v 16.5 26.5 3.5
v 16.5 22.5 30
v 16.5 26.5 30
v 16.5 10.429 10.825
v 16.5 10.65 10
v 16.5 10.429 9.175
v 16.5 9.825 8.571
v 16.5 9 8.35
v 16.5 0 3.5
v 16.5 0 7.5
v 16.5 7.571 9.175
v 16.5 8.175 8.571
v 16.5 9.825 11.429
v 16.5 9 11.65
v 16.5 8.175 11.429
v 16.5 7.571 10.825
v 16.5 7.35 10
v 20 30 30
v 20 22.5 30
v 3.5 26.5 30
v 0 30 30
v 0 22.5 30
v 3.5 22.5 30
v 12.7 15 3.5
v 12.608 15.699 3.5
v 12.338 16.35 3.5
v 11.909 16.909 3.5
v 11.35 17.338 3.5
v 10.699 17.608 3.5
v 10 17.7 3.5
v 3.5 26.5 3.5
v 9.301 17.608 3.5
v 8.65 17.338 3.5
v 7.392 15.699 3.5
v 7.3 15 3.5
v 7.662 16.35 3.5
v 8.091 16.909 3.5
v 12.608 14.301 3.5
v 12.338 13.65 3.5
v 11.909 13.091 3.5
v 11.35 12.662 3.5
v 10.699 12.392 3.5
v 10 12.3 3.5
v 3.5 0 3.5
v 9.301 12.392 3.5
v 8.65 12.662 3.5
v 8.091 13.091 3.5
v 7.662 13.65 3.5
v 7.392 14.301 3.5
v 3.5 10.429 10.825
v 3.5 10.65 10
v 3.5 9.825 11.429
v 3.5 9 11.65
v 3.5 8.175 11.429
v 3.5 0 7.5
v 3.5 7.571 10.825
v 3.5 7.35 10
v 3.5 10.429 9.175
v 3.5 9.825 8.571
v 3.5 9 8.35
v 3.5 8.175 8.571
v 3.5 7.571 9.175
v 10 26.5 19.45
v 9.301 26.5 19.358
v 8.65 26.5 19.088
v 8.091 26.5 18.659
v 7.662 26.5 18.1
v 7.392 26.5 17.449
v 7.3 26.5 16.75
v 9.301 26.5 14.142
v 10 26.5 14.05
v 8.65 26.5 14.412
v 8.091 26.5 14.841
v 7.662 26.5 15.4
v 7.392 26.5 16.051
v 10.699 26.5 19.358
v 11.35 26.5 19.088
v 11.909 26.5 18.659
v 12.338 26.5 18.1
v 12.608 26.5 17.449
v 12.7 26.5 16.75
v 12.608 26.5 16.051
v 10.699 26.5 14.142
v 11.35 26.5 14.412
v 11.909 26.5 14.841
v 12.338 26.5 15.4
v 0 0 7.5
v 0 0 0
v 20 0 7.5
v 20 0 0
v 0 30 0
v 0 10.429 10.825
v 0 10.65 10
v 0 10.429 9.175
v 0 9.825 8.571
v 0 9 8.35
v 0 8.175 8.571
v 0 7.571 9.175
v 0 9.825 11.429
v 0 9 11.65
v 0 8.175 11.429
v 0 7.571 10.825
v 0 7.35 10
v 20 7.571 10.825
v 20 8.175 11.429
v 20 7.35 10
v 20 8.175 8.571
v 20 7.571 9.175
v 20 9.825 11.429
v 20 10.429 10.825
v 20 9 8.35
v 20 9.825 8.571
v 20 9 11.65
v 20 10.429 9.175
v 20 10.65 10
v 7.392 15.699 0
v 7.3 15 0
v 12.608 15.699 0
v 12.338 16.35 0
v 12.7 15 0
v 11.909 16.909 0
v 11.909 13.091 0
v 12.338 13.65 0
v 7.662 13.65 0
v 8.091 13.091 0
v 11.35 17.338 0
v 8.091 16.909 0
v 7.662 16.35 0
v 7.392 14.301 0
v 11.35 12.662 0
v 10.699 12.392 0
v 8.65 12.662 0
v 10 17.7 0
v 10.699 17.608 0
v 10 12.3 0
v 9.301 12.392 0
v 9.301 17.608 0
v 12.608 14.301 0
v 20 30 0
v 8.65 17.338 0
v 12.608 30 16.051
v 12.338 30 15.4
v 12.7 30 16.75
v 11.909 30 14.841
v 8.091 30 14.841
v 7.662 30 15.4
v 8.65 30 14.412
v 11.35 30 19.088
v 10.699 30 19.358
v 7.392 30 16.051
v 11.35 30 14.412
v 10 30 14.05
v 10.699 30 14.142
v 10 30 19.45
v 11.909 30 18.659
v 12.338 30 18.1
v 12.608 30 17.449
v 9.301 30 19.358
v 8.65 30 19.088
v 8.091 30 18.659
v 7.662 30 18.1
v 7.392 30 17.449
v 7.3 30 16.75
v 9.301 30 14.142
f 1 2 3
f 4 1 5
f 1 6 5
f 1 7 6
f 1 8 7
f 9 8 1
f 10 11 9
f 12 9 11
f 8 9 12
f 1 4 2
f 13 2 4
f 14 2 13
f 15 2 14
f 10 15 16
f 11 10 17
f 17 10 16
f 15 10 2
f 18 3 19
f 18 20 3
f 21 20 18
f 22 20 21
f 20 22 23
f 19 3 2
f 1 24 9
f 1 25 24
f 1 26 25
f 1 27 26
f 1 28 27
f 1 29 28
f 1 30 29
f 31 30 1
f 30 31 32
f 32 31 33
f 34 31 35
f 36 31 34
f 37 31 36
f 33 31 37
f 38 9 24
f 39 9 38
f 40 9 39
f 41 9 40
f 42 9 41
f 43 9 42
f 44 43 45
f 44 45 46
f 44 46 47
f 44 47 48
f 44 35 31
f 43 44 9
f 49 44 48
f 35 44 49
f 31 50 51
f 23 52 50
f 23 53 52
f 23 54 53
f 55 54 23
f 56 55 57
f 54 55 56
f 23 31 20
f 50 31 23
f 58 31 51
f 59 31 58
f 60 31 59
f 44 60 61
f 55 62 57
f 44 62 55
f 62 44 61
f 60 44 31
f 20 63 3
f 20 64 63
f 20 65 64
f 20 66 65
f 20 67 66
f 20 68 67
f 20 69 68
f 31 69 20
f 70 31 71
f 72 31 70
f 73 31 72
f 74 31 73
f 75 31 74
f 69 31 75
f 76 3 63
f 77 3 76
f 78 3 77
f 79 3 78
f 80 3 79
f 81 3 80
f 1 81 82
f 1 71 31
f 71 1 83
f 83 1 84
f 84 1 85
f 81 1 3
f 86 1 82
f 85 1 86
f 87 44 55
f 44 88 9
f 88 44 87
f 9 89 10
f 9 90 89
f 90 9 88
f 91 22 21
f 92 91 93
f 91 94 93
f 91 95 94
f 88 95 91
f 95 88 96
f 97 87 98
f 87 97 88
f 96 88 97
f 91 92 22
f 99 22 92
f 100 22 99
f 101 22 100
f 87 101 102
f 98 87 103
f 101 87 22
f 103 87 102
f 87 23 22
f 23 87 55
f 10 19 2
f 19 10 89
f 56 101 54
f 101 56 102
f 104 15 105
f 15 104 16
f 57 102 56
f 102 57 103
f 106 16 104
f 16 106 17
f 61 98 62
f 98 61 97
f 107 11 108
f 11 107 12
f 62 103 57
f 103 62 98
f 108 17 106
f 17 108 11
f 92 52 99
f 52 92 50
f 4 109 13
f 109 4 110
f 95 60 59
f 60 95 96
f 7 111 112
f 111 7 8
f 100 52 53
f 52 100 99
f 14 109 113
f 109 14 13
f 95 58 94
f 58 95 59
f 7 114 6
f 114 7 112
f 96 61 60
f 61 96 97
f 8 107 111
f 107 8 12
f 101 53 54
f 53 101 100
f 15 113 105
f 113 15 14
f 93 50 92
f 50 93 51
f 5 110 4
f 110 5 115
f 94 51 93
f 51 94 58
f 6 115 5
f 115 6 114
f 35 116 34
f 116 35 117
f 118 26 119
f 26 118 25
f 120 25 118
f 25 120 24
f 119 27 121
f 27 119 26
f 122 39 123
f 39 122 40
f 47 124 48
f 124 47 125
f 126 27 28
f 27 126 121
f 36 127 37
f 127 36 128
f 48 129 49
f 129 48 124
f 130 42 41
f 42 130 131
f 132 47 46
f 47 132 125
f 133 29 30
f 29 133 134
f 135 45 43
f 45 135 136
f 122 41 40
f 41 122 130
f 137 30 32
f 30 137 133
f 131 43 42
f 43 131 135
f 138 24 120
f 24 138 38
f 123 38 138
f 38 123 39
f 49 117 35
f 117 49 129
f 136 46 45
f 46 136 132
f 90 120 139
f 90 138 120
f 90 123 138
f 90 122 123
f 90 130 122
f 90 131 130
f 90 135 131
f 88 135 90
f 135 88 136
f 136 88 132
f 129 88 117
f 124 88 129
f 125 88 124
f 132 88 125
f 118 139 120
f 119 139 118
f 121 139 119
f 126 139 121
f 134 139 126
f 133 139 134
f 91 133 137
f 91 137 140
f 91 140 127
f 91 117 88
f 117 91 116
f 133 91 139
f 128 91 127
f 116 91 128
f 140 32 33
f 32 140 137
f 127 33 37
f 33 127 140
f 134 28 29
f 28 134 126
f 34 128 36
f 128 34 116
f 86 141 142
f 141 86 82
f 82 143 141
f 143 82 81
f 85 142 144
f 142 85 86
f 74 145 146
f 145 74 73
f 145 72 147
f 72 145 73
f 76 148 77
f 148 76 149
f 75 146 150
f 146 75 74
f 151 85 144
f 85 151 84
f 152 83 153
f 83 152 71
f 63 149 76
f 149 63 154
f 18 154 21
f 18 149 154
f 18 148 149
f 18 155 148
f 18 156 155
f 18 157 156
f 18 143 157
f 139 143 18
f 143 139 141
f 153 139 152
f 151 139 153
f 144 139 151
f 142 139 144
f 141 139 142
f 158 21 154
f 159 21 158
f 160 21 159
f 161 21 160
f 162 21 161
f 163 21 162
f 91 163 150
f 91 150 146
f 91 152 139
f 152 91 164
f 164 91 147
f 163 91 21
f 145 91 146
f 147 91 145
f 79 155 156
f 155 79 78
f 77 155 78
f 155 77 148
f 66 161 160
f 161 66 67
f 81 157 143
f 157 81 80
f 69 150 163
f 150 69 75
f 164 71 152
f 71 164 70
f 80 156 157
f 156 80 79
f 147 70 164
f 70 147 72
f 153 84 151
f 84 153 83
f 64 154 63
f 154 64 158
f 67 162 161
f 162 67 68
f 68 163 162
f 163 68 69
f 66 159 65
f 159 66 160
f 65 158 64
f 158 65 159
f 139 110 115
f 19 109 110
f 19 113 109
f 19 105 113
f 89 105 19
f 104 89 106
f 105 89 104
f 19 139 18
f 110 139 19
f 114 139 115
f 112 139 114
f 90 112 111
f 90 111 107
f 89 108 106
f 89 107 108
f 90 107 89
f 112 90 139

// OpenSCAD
t=3.5;
difference()
{
    
    cube([20,30,30]);

    union()
    {
        translate([t,0,t])
            cube([20-t*2,30-t,30-t]);
        
        translate([0,0,t+4])
            rotate([45,0,0])
                cube([30,40,40]);
        
        translate([0,30-21,10])
            rotate([0,90,0])
                cylinder(d=3.3,h=t+30,$fn=12);
        
        translate([10,15,0])
            cylinder(d=5.4,h=t,$fn=24);
        translate([10,30-t,t+(30-t)/2])
            rotate([270,0,0])
            cylinder(d=5.4,h=t,$fn=24);
    }

}
